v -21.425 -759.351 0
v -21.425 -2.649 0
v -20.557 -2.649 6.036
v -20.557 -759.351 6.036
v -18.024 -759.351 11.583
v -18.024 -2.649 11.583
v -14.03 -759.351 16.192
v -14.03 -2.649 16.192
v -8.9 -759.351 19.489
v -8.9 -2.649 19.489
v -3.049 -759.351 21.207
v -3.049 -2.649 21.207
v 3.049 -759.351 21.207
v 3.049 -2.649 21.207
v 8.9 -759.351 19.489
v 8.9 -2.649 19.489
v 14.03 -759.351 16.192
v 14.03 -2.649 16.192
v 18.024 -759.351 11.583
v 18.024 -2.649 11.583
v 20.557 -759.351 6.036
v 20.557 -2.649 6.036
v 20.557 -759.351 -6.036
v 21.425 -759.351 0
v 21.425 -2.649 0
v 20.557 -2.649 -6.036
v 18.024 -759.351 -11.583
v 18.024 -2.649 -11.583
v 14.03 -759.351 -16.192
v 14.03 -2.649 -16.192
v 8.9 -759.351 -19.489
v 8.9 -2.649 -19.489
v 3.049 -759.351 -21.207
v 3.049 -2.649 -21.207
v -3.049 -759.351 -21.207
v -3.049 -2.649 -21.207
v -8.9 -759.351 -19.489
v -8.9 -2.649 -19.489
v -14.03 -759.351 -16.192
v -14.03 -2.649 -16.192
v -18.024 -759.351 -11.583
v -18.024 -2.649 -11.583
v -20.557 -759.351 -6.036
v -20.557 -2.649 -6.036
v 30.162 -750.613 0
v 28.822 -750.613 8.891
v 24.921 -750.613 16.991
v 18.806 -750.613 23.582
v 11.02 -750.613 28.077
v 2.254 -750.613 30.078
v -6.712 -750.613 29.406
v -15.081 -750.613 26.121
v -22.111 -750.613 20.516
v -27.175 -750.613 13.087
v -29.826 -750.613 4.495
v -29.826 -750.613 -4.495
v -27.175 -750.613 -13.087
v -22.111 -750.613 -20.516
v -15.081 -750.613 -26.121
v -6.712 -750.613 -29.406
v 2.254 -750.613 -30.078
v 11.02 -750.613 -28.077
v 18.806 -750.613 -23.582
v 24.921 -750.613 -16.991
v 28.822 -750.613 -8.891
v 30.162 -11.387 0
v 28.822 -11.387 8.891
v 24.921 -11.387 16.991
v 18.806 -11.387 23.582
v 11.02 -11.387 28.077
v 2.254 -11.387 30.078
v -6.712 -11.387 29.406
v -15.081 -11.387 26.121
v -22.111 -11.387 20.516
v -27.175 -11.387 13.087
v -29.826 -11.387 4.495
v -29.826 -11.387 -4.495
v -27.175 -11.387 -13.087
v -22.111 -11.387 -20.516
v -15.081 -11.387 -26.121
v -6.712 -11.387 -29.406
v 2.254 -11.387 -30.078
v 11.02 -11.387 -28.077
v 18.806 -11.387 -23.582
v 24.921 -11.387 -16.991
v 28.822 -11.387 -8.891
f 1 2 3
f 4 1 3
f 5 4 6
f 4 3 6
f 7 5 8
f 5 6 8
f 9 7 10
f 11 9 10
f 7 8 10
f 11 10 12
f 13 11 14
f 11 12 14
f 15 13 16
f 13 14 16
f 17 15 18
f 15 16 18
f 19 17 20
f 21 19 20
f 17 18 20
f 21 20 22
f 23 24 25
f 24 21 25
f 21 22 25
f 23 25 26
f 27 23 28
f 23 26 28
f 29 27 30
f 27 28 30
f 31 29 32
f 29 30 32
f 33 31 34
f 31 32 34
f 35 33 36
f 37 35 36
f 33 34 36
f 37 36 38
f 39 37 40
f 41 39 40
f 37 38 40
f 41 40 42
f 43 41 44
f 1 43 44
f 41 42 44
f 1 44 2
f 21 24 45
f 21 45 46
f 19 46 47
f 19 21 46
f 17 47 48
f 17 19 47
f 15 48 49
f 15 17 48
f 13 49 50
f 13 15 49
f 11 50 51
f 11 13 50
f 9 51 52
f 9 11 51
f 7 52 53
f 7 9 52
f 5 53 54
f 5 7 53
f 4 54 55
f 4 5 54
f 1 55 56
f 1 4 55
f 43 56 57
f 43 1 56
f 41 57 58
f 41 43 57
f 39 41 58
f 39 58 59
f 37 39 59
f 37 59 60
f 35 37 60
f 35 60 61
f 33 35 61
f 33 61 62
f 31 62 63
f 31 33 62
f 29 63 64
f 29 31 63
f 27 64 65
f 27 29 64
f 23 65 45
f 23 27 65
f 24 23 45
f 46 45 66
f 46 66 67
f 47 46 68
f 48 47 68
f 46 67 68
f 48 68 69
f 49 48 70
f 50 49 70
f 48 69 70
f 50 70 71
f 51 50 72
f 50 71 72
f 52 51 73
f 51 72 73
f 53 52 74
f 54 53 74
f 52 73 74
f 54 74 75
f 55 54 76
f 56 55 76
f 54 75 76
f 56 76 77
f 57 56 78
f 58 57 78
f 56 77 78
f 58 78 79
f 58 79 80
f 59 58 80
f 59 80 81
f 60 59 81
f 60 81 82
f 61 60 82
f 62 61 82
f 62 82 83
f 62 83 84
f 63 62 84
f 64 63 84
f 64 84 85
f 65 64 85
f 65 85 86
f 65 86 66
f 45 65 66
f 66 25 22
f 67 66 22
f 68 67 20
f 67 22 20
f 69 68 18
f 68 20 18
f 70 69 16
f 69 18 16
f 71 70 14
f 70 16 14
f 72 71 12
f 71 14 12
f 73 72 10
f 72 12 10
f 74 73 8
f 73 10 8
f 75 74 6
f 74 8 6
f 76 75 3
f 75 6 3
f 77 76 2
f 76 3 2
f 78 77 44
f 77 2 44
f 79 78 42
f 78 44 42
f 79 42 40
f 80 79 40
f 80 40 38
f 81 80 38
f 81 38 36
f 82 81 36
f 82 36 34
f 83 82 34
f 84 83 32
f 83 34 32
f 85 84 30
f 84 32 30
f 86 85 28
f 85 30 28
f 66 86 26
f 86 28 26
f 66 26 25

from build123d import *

# Parameters (mm, degrees)
F0_R     = 30.1625
F1_DEPTH = 762
F3_D     = 42.8498


# Not quite as in the source:
# - a fillet or chamfer that OpenCascade refuses, or shapes differently, is made with other operations: its cross-section is extruded or revolved along the edge and cut away or added


with BuildPart() as f1:
    # F0 (on Front) → F1 (new body)
    with BuildSketch(Plane.XZ):
        Circle(F0_R)
    extrude(amount=F1_DEPTH)

    # F3 (through all)
    with Locations(Plane.XZ.offset(762)):
        with Locations((0, 0)):
            Hole(F3_D / 2)

    # F4: chamfer of 11.38682 on 2 edges, made by hand

    # F4_s1 → F4_t2 (revolve, cut)
    with BuildSketch(Plane.XY):
        Polygon((30.1625, -750.61318), (18.77568, -762), (30.1625, -762), align=None)
    revolve(axis=Axis((0, -762, 0), (0, -1, 0)), mode=Mode.SUBTRACT)

    # F4_s3 → F4_t4 (revolve, cut)
    with BuildSketch(Plane.XY):
        Polygon((30.1625, -11.38682), (18.77568, 0), (30.1625, 0), align=None)
    revolve(axis=Axis((0, 0, 0), (0, -1, 0)), mode=Mode.SUBTRACT)


solid = f1.part
